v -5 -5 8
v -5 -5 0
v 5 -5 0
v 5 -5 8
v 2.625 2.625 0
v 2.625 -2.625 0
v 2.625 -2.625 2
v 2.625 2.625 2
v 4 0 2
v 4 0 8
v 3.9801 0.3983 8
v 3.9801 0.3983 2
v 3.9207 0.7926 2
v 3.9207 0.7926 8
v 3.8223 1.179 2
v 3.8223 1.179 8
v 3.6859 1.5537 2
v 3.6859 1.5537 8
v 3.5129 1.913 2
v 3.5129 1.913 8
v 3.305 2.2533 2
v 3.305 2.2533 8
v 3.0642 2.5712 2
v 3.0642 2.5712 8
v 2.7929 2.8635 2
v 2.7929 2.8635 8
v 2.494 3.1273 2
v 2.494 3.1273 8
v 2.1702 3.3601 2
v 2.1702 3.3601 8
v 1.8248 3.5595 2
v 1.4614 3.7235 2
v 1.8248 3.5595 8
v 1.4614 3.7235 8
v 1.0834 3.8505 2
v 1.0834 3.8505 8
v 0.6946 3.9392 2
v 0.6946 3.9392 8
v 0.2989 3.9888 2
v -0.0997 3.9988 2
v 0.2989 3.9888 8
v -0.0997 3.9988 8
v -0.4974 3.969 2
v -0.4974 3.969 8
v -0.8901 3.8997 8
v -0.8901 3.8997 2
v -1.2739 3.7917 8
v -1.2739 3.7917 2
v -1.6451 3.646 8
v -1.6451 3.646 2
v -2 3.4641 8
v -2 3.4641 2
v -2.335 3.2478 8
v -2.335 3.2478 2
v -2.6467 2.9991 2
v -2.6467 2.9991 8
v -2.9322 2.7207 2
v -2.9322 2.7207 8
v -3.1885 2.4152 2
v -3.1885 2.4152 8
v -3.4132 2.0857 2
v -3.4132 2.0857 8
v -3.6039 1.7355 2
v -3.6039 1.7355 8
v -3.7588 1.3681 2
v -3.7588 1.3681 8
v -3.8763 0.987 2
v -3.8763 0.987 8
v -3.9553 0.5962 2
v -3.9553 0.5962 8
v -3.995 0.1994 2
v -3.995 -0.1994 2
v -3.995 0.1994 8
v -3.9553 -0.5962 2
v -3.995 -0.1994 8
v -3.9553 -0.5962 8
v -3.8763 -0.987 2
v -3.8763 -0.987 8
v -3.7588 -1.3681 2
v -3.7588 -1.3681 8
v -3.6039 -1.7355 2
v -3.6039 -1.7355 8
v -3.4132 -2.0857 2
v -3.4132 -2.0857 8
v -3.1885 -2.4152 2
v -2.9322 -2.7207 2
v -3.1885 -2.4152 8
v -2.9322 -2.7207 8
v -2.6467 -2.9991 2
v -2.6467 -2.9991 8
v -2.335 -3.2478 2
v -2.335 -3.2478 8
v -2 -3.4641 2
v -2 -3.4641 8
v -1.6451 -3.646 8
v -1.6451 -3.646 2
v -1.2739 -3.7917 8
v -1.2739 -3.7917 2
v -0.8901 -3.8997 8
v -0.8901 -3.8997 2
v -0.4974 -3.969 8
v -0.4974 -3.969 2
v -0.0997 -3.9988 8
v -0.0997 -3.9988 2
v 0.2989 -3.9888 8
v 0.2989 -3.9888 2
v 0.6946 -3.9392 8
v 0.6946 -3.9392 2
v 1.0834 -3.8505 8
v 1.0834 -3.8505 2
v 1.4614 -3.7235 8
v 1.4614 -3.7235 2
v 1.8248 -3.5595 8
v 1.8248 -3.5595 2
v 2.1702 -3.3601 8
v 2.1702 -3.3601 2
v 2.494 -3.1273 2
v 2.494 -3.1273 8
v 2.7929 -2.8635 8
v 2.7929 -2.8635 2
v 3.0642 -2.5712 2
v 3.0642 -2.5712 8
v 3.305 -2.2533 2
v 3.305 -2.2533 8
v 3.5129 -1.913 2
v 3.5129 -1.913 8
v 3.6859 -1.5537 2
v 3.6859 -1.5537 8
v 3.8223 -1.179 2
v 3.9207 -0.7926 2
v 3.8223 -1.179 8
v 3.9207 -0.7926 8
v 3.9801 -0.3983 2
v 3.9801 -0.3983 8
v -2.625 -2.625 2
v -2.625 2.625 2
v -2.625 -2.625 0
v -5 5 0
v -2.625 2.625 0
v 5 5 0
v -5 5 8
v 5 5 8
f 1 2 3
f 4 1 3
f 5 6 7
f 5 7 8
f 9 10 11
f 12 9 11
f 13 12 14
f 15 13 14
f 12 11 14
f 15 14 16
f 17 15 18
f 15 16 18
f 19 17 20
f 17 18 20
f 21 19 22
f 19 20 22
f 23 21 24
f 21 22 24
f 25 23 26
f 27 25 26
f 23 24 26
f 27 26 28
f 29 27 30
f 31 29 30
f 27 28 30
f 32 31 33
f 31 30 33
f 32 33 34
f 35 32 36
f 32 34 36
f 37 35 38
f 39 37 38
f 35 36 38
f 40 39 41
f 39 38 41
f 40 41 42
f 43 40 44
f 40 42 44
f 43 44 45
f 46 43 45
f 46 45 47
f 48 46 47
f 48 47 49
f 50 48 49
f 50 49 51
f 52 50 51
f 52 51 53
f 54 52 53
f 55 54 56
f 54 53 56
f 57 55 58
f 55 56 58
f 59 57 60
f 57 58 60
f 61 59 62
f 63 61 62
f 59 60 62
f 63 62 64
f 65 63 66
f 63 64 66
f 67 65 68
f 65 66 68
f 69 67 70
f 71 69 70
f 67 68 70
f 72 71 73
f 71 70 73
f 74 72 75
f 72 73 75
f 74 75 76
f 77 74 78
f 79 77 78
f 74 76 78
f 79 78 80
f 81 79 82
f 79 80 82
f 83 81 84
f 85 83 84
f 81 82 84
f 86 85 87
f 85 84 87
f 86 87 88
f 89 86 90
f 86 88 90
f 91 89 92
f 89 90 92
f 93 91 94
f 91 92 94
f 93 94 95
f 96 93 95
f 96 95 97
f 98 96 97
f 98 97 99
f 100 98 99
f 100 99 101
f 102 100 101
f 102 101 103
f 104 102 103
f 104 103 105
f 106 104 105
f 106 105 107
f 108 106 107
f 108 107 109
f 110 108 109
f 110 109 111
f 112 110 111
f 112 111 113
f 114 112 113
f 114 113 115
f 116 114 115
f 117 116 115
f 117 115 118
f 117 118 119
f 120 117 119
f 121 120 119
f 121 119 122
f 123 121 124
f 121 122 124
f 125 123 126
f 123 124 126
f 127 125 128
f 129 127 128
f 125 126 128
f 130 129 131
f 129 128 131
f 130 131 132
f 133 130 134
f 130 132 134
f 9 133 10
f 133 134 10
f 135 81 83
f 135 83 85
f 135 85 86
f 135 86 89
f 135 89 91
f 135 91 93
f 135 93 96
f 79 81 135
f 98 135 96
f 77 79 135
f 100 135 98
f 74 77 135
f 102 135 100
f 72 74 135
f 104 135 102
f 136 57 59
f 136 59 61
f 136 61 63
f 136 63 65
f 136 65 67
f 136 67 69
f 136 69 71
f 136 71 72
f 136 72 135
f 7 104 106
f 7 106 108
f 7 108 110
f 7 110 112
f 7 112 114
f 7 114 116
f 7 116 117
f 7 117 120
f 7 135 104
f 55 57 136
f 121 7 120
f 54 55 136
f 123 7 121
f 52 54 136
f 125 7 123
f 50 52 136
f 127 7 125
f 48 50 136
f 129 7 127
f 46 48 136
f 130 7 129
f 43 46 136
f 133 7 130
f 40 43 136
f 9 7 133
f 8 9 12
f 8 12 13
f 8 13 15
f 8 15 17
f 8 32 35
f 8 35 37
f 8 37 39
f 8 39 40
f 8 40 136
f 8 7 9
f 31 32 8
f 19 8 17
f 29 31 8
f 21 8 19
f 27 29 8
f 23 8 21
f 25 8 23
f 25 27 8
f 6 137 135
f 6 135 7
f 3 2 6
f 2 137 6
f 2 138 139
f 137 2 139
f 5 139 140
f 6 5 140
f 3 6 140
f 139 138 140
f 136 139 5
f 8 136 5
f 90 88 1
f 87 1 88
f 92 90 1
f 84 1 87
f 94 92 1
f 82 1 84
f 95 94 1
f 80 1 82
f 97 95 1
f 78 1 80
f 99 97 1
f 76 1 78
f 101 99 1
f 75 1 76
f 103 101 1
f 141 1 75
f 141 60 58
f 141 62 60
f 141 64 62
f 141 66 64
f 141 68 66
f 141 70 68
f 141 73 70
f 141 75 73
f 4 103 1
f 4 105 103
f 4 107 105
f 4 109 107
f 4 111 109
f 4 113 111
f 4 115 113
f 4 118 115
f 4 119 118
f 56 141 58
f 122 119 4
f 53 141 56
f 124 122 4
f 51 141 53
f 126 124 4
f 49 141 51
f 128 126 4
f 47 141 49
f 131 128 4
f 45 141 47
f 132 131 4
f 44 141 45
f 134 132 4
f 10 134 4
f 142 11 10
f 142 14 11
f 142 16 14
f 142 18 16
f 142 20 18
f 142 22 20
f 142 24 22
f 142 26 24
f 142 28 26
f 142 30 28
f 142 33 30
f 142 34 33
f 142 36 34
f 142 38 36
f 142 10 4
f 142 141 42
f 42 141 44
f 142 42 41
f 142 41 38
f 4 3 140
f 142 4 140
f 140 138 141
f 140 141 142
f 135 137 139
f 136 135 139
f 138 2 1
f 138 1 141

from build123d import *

# Parameters (mm, degrees)
F0_W     = 10
F0_H     = 10
F1_DEPTH = 8
F2_R     = 4
F3_DEPTH = 6
F4_W     = 5.25
F4_H     = 5.25
F5_DEPTH = 3


# Not quite as in the source:
# - a feature names something its author has since deleted; it is built from what else it names


with BuildPart() as f1:
    # F0 (on Top) → F1 (new body)
    with BuildSketch(Plane.XY):
        Rectangle(F0_W, F0_H)
    extrude(amount=F1_DEPTH)

    # F2 (on face) → F3 (cut)
    with BuildSketch(Plane.XY.offset(8)):
        Circle(F2_R)
    extrude(amount=-F3_DEPTH, mode=Mode.SUBTRACT)

    # F4 (on face) → F5 (cut)
    with BuildSketch(Plane.XY):
        Rectangle(F4_W, F4_H)
    extrude(amount=F5_DEPTH, mode=Mode.SUBTRACT)


solid = f1.part
